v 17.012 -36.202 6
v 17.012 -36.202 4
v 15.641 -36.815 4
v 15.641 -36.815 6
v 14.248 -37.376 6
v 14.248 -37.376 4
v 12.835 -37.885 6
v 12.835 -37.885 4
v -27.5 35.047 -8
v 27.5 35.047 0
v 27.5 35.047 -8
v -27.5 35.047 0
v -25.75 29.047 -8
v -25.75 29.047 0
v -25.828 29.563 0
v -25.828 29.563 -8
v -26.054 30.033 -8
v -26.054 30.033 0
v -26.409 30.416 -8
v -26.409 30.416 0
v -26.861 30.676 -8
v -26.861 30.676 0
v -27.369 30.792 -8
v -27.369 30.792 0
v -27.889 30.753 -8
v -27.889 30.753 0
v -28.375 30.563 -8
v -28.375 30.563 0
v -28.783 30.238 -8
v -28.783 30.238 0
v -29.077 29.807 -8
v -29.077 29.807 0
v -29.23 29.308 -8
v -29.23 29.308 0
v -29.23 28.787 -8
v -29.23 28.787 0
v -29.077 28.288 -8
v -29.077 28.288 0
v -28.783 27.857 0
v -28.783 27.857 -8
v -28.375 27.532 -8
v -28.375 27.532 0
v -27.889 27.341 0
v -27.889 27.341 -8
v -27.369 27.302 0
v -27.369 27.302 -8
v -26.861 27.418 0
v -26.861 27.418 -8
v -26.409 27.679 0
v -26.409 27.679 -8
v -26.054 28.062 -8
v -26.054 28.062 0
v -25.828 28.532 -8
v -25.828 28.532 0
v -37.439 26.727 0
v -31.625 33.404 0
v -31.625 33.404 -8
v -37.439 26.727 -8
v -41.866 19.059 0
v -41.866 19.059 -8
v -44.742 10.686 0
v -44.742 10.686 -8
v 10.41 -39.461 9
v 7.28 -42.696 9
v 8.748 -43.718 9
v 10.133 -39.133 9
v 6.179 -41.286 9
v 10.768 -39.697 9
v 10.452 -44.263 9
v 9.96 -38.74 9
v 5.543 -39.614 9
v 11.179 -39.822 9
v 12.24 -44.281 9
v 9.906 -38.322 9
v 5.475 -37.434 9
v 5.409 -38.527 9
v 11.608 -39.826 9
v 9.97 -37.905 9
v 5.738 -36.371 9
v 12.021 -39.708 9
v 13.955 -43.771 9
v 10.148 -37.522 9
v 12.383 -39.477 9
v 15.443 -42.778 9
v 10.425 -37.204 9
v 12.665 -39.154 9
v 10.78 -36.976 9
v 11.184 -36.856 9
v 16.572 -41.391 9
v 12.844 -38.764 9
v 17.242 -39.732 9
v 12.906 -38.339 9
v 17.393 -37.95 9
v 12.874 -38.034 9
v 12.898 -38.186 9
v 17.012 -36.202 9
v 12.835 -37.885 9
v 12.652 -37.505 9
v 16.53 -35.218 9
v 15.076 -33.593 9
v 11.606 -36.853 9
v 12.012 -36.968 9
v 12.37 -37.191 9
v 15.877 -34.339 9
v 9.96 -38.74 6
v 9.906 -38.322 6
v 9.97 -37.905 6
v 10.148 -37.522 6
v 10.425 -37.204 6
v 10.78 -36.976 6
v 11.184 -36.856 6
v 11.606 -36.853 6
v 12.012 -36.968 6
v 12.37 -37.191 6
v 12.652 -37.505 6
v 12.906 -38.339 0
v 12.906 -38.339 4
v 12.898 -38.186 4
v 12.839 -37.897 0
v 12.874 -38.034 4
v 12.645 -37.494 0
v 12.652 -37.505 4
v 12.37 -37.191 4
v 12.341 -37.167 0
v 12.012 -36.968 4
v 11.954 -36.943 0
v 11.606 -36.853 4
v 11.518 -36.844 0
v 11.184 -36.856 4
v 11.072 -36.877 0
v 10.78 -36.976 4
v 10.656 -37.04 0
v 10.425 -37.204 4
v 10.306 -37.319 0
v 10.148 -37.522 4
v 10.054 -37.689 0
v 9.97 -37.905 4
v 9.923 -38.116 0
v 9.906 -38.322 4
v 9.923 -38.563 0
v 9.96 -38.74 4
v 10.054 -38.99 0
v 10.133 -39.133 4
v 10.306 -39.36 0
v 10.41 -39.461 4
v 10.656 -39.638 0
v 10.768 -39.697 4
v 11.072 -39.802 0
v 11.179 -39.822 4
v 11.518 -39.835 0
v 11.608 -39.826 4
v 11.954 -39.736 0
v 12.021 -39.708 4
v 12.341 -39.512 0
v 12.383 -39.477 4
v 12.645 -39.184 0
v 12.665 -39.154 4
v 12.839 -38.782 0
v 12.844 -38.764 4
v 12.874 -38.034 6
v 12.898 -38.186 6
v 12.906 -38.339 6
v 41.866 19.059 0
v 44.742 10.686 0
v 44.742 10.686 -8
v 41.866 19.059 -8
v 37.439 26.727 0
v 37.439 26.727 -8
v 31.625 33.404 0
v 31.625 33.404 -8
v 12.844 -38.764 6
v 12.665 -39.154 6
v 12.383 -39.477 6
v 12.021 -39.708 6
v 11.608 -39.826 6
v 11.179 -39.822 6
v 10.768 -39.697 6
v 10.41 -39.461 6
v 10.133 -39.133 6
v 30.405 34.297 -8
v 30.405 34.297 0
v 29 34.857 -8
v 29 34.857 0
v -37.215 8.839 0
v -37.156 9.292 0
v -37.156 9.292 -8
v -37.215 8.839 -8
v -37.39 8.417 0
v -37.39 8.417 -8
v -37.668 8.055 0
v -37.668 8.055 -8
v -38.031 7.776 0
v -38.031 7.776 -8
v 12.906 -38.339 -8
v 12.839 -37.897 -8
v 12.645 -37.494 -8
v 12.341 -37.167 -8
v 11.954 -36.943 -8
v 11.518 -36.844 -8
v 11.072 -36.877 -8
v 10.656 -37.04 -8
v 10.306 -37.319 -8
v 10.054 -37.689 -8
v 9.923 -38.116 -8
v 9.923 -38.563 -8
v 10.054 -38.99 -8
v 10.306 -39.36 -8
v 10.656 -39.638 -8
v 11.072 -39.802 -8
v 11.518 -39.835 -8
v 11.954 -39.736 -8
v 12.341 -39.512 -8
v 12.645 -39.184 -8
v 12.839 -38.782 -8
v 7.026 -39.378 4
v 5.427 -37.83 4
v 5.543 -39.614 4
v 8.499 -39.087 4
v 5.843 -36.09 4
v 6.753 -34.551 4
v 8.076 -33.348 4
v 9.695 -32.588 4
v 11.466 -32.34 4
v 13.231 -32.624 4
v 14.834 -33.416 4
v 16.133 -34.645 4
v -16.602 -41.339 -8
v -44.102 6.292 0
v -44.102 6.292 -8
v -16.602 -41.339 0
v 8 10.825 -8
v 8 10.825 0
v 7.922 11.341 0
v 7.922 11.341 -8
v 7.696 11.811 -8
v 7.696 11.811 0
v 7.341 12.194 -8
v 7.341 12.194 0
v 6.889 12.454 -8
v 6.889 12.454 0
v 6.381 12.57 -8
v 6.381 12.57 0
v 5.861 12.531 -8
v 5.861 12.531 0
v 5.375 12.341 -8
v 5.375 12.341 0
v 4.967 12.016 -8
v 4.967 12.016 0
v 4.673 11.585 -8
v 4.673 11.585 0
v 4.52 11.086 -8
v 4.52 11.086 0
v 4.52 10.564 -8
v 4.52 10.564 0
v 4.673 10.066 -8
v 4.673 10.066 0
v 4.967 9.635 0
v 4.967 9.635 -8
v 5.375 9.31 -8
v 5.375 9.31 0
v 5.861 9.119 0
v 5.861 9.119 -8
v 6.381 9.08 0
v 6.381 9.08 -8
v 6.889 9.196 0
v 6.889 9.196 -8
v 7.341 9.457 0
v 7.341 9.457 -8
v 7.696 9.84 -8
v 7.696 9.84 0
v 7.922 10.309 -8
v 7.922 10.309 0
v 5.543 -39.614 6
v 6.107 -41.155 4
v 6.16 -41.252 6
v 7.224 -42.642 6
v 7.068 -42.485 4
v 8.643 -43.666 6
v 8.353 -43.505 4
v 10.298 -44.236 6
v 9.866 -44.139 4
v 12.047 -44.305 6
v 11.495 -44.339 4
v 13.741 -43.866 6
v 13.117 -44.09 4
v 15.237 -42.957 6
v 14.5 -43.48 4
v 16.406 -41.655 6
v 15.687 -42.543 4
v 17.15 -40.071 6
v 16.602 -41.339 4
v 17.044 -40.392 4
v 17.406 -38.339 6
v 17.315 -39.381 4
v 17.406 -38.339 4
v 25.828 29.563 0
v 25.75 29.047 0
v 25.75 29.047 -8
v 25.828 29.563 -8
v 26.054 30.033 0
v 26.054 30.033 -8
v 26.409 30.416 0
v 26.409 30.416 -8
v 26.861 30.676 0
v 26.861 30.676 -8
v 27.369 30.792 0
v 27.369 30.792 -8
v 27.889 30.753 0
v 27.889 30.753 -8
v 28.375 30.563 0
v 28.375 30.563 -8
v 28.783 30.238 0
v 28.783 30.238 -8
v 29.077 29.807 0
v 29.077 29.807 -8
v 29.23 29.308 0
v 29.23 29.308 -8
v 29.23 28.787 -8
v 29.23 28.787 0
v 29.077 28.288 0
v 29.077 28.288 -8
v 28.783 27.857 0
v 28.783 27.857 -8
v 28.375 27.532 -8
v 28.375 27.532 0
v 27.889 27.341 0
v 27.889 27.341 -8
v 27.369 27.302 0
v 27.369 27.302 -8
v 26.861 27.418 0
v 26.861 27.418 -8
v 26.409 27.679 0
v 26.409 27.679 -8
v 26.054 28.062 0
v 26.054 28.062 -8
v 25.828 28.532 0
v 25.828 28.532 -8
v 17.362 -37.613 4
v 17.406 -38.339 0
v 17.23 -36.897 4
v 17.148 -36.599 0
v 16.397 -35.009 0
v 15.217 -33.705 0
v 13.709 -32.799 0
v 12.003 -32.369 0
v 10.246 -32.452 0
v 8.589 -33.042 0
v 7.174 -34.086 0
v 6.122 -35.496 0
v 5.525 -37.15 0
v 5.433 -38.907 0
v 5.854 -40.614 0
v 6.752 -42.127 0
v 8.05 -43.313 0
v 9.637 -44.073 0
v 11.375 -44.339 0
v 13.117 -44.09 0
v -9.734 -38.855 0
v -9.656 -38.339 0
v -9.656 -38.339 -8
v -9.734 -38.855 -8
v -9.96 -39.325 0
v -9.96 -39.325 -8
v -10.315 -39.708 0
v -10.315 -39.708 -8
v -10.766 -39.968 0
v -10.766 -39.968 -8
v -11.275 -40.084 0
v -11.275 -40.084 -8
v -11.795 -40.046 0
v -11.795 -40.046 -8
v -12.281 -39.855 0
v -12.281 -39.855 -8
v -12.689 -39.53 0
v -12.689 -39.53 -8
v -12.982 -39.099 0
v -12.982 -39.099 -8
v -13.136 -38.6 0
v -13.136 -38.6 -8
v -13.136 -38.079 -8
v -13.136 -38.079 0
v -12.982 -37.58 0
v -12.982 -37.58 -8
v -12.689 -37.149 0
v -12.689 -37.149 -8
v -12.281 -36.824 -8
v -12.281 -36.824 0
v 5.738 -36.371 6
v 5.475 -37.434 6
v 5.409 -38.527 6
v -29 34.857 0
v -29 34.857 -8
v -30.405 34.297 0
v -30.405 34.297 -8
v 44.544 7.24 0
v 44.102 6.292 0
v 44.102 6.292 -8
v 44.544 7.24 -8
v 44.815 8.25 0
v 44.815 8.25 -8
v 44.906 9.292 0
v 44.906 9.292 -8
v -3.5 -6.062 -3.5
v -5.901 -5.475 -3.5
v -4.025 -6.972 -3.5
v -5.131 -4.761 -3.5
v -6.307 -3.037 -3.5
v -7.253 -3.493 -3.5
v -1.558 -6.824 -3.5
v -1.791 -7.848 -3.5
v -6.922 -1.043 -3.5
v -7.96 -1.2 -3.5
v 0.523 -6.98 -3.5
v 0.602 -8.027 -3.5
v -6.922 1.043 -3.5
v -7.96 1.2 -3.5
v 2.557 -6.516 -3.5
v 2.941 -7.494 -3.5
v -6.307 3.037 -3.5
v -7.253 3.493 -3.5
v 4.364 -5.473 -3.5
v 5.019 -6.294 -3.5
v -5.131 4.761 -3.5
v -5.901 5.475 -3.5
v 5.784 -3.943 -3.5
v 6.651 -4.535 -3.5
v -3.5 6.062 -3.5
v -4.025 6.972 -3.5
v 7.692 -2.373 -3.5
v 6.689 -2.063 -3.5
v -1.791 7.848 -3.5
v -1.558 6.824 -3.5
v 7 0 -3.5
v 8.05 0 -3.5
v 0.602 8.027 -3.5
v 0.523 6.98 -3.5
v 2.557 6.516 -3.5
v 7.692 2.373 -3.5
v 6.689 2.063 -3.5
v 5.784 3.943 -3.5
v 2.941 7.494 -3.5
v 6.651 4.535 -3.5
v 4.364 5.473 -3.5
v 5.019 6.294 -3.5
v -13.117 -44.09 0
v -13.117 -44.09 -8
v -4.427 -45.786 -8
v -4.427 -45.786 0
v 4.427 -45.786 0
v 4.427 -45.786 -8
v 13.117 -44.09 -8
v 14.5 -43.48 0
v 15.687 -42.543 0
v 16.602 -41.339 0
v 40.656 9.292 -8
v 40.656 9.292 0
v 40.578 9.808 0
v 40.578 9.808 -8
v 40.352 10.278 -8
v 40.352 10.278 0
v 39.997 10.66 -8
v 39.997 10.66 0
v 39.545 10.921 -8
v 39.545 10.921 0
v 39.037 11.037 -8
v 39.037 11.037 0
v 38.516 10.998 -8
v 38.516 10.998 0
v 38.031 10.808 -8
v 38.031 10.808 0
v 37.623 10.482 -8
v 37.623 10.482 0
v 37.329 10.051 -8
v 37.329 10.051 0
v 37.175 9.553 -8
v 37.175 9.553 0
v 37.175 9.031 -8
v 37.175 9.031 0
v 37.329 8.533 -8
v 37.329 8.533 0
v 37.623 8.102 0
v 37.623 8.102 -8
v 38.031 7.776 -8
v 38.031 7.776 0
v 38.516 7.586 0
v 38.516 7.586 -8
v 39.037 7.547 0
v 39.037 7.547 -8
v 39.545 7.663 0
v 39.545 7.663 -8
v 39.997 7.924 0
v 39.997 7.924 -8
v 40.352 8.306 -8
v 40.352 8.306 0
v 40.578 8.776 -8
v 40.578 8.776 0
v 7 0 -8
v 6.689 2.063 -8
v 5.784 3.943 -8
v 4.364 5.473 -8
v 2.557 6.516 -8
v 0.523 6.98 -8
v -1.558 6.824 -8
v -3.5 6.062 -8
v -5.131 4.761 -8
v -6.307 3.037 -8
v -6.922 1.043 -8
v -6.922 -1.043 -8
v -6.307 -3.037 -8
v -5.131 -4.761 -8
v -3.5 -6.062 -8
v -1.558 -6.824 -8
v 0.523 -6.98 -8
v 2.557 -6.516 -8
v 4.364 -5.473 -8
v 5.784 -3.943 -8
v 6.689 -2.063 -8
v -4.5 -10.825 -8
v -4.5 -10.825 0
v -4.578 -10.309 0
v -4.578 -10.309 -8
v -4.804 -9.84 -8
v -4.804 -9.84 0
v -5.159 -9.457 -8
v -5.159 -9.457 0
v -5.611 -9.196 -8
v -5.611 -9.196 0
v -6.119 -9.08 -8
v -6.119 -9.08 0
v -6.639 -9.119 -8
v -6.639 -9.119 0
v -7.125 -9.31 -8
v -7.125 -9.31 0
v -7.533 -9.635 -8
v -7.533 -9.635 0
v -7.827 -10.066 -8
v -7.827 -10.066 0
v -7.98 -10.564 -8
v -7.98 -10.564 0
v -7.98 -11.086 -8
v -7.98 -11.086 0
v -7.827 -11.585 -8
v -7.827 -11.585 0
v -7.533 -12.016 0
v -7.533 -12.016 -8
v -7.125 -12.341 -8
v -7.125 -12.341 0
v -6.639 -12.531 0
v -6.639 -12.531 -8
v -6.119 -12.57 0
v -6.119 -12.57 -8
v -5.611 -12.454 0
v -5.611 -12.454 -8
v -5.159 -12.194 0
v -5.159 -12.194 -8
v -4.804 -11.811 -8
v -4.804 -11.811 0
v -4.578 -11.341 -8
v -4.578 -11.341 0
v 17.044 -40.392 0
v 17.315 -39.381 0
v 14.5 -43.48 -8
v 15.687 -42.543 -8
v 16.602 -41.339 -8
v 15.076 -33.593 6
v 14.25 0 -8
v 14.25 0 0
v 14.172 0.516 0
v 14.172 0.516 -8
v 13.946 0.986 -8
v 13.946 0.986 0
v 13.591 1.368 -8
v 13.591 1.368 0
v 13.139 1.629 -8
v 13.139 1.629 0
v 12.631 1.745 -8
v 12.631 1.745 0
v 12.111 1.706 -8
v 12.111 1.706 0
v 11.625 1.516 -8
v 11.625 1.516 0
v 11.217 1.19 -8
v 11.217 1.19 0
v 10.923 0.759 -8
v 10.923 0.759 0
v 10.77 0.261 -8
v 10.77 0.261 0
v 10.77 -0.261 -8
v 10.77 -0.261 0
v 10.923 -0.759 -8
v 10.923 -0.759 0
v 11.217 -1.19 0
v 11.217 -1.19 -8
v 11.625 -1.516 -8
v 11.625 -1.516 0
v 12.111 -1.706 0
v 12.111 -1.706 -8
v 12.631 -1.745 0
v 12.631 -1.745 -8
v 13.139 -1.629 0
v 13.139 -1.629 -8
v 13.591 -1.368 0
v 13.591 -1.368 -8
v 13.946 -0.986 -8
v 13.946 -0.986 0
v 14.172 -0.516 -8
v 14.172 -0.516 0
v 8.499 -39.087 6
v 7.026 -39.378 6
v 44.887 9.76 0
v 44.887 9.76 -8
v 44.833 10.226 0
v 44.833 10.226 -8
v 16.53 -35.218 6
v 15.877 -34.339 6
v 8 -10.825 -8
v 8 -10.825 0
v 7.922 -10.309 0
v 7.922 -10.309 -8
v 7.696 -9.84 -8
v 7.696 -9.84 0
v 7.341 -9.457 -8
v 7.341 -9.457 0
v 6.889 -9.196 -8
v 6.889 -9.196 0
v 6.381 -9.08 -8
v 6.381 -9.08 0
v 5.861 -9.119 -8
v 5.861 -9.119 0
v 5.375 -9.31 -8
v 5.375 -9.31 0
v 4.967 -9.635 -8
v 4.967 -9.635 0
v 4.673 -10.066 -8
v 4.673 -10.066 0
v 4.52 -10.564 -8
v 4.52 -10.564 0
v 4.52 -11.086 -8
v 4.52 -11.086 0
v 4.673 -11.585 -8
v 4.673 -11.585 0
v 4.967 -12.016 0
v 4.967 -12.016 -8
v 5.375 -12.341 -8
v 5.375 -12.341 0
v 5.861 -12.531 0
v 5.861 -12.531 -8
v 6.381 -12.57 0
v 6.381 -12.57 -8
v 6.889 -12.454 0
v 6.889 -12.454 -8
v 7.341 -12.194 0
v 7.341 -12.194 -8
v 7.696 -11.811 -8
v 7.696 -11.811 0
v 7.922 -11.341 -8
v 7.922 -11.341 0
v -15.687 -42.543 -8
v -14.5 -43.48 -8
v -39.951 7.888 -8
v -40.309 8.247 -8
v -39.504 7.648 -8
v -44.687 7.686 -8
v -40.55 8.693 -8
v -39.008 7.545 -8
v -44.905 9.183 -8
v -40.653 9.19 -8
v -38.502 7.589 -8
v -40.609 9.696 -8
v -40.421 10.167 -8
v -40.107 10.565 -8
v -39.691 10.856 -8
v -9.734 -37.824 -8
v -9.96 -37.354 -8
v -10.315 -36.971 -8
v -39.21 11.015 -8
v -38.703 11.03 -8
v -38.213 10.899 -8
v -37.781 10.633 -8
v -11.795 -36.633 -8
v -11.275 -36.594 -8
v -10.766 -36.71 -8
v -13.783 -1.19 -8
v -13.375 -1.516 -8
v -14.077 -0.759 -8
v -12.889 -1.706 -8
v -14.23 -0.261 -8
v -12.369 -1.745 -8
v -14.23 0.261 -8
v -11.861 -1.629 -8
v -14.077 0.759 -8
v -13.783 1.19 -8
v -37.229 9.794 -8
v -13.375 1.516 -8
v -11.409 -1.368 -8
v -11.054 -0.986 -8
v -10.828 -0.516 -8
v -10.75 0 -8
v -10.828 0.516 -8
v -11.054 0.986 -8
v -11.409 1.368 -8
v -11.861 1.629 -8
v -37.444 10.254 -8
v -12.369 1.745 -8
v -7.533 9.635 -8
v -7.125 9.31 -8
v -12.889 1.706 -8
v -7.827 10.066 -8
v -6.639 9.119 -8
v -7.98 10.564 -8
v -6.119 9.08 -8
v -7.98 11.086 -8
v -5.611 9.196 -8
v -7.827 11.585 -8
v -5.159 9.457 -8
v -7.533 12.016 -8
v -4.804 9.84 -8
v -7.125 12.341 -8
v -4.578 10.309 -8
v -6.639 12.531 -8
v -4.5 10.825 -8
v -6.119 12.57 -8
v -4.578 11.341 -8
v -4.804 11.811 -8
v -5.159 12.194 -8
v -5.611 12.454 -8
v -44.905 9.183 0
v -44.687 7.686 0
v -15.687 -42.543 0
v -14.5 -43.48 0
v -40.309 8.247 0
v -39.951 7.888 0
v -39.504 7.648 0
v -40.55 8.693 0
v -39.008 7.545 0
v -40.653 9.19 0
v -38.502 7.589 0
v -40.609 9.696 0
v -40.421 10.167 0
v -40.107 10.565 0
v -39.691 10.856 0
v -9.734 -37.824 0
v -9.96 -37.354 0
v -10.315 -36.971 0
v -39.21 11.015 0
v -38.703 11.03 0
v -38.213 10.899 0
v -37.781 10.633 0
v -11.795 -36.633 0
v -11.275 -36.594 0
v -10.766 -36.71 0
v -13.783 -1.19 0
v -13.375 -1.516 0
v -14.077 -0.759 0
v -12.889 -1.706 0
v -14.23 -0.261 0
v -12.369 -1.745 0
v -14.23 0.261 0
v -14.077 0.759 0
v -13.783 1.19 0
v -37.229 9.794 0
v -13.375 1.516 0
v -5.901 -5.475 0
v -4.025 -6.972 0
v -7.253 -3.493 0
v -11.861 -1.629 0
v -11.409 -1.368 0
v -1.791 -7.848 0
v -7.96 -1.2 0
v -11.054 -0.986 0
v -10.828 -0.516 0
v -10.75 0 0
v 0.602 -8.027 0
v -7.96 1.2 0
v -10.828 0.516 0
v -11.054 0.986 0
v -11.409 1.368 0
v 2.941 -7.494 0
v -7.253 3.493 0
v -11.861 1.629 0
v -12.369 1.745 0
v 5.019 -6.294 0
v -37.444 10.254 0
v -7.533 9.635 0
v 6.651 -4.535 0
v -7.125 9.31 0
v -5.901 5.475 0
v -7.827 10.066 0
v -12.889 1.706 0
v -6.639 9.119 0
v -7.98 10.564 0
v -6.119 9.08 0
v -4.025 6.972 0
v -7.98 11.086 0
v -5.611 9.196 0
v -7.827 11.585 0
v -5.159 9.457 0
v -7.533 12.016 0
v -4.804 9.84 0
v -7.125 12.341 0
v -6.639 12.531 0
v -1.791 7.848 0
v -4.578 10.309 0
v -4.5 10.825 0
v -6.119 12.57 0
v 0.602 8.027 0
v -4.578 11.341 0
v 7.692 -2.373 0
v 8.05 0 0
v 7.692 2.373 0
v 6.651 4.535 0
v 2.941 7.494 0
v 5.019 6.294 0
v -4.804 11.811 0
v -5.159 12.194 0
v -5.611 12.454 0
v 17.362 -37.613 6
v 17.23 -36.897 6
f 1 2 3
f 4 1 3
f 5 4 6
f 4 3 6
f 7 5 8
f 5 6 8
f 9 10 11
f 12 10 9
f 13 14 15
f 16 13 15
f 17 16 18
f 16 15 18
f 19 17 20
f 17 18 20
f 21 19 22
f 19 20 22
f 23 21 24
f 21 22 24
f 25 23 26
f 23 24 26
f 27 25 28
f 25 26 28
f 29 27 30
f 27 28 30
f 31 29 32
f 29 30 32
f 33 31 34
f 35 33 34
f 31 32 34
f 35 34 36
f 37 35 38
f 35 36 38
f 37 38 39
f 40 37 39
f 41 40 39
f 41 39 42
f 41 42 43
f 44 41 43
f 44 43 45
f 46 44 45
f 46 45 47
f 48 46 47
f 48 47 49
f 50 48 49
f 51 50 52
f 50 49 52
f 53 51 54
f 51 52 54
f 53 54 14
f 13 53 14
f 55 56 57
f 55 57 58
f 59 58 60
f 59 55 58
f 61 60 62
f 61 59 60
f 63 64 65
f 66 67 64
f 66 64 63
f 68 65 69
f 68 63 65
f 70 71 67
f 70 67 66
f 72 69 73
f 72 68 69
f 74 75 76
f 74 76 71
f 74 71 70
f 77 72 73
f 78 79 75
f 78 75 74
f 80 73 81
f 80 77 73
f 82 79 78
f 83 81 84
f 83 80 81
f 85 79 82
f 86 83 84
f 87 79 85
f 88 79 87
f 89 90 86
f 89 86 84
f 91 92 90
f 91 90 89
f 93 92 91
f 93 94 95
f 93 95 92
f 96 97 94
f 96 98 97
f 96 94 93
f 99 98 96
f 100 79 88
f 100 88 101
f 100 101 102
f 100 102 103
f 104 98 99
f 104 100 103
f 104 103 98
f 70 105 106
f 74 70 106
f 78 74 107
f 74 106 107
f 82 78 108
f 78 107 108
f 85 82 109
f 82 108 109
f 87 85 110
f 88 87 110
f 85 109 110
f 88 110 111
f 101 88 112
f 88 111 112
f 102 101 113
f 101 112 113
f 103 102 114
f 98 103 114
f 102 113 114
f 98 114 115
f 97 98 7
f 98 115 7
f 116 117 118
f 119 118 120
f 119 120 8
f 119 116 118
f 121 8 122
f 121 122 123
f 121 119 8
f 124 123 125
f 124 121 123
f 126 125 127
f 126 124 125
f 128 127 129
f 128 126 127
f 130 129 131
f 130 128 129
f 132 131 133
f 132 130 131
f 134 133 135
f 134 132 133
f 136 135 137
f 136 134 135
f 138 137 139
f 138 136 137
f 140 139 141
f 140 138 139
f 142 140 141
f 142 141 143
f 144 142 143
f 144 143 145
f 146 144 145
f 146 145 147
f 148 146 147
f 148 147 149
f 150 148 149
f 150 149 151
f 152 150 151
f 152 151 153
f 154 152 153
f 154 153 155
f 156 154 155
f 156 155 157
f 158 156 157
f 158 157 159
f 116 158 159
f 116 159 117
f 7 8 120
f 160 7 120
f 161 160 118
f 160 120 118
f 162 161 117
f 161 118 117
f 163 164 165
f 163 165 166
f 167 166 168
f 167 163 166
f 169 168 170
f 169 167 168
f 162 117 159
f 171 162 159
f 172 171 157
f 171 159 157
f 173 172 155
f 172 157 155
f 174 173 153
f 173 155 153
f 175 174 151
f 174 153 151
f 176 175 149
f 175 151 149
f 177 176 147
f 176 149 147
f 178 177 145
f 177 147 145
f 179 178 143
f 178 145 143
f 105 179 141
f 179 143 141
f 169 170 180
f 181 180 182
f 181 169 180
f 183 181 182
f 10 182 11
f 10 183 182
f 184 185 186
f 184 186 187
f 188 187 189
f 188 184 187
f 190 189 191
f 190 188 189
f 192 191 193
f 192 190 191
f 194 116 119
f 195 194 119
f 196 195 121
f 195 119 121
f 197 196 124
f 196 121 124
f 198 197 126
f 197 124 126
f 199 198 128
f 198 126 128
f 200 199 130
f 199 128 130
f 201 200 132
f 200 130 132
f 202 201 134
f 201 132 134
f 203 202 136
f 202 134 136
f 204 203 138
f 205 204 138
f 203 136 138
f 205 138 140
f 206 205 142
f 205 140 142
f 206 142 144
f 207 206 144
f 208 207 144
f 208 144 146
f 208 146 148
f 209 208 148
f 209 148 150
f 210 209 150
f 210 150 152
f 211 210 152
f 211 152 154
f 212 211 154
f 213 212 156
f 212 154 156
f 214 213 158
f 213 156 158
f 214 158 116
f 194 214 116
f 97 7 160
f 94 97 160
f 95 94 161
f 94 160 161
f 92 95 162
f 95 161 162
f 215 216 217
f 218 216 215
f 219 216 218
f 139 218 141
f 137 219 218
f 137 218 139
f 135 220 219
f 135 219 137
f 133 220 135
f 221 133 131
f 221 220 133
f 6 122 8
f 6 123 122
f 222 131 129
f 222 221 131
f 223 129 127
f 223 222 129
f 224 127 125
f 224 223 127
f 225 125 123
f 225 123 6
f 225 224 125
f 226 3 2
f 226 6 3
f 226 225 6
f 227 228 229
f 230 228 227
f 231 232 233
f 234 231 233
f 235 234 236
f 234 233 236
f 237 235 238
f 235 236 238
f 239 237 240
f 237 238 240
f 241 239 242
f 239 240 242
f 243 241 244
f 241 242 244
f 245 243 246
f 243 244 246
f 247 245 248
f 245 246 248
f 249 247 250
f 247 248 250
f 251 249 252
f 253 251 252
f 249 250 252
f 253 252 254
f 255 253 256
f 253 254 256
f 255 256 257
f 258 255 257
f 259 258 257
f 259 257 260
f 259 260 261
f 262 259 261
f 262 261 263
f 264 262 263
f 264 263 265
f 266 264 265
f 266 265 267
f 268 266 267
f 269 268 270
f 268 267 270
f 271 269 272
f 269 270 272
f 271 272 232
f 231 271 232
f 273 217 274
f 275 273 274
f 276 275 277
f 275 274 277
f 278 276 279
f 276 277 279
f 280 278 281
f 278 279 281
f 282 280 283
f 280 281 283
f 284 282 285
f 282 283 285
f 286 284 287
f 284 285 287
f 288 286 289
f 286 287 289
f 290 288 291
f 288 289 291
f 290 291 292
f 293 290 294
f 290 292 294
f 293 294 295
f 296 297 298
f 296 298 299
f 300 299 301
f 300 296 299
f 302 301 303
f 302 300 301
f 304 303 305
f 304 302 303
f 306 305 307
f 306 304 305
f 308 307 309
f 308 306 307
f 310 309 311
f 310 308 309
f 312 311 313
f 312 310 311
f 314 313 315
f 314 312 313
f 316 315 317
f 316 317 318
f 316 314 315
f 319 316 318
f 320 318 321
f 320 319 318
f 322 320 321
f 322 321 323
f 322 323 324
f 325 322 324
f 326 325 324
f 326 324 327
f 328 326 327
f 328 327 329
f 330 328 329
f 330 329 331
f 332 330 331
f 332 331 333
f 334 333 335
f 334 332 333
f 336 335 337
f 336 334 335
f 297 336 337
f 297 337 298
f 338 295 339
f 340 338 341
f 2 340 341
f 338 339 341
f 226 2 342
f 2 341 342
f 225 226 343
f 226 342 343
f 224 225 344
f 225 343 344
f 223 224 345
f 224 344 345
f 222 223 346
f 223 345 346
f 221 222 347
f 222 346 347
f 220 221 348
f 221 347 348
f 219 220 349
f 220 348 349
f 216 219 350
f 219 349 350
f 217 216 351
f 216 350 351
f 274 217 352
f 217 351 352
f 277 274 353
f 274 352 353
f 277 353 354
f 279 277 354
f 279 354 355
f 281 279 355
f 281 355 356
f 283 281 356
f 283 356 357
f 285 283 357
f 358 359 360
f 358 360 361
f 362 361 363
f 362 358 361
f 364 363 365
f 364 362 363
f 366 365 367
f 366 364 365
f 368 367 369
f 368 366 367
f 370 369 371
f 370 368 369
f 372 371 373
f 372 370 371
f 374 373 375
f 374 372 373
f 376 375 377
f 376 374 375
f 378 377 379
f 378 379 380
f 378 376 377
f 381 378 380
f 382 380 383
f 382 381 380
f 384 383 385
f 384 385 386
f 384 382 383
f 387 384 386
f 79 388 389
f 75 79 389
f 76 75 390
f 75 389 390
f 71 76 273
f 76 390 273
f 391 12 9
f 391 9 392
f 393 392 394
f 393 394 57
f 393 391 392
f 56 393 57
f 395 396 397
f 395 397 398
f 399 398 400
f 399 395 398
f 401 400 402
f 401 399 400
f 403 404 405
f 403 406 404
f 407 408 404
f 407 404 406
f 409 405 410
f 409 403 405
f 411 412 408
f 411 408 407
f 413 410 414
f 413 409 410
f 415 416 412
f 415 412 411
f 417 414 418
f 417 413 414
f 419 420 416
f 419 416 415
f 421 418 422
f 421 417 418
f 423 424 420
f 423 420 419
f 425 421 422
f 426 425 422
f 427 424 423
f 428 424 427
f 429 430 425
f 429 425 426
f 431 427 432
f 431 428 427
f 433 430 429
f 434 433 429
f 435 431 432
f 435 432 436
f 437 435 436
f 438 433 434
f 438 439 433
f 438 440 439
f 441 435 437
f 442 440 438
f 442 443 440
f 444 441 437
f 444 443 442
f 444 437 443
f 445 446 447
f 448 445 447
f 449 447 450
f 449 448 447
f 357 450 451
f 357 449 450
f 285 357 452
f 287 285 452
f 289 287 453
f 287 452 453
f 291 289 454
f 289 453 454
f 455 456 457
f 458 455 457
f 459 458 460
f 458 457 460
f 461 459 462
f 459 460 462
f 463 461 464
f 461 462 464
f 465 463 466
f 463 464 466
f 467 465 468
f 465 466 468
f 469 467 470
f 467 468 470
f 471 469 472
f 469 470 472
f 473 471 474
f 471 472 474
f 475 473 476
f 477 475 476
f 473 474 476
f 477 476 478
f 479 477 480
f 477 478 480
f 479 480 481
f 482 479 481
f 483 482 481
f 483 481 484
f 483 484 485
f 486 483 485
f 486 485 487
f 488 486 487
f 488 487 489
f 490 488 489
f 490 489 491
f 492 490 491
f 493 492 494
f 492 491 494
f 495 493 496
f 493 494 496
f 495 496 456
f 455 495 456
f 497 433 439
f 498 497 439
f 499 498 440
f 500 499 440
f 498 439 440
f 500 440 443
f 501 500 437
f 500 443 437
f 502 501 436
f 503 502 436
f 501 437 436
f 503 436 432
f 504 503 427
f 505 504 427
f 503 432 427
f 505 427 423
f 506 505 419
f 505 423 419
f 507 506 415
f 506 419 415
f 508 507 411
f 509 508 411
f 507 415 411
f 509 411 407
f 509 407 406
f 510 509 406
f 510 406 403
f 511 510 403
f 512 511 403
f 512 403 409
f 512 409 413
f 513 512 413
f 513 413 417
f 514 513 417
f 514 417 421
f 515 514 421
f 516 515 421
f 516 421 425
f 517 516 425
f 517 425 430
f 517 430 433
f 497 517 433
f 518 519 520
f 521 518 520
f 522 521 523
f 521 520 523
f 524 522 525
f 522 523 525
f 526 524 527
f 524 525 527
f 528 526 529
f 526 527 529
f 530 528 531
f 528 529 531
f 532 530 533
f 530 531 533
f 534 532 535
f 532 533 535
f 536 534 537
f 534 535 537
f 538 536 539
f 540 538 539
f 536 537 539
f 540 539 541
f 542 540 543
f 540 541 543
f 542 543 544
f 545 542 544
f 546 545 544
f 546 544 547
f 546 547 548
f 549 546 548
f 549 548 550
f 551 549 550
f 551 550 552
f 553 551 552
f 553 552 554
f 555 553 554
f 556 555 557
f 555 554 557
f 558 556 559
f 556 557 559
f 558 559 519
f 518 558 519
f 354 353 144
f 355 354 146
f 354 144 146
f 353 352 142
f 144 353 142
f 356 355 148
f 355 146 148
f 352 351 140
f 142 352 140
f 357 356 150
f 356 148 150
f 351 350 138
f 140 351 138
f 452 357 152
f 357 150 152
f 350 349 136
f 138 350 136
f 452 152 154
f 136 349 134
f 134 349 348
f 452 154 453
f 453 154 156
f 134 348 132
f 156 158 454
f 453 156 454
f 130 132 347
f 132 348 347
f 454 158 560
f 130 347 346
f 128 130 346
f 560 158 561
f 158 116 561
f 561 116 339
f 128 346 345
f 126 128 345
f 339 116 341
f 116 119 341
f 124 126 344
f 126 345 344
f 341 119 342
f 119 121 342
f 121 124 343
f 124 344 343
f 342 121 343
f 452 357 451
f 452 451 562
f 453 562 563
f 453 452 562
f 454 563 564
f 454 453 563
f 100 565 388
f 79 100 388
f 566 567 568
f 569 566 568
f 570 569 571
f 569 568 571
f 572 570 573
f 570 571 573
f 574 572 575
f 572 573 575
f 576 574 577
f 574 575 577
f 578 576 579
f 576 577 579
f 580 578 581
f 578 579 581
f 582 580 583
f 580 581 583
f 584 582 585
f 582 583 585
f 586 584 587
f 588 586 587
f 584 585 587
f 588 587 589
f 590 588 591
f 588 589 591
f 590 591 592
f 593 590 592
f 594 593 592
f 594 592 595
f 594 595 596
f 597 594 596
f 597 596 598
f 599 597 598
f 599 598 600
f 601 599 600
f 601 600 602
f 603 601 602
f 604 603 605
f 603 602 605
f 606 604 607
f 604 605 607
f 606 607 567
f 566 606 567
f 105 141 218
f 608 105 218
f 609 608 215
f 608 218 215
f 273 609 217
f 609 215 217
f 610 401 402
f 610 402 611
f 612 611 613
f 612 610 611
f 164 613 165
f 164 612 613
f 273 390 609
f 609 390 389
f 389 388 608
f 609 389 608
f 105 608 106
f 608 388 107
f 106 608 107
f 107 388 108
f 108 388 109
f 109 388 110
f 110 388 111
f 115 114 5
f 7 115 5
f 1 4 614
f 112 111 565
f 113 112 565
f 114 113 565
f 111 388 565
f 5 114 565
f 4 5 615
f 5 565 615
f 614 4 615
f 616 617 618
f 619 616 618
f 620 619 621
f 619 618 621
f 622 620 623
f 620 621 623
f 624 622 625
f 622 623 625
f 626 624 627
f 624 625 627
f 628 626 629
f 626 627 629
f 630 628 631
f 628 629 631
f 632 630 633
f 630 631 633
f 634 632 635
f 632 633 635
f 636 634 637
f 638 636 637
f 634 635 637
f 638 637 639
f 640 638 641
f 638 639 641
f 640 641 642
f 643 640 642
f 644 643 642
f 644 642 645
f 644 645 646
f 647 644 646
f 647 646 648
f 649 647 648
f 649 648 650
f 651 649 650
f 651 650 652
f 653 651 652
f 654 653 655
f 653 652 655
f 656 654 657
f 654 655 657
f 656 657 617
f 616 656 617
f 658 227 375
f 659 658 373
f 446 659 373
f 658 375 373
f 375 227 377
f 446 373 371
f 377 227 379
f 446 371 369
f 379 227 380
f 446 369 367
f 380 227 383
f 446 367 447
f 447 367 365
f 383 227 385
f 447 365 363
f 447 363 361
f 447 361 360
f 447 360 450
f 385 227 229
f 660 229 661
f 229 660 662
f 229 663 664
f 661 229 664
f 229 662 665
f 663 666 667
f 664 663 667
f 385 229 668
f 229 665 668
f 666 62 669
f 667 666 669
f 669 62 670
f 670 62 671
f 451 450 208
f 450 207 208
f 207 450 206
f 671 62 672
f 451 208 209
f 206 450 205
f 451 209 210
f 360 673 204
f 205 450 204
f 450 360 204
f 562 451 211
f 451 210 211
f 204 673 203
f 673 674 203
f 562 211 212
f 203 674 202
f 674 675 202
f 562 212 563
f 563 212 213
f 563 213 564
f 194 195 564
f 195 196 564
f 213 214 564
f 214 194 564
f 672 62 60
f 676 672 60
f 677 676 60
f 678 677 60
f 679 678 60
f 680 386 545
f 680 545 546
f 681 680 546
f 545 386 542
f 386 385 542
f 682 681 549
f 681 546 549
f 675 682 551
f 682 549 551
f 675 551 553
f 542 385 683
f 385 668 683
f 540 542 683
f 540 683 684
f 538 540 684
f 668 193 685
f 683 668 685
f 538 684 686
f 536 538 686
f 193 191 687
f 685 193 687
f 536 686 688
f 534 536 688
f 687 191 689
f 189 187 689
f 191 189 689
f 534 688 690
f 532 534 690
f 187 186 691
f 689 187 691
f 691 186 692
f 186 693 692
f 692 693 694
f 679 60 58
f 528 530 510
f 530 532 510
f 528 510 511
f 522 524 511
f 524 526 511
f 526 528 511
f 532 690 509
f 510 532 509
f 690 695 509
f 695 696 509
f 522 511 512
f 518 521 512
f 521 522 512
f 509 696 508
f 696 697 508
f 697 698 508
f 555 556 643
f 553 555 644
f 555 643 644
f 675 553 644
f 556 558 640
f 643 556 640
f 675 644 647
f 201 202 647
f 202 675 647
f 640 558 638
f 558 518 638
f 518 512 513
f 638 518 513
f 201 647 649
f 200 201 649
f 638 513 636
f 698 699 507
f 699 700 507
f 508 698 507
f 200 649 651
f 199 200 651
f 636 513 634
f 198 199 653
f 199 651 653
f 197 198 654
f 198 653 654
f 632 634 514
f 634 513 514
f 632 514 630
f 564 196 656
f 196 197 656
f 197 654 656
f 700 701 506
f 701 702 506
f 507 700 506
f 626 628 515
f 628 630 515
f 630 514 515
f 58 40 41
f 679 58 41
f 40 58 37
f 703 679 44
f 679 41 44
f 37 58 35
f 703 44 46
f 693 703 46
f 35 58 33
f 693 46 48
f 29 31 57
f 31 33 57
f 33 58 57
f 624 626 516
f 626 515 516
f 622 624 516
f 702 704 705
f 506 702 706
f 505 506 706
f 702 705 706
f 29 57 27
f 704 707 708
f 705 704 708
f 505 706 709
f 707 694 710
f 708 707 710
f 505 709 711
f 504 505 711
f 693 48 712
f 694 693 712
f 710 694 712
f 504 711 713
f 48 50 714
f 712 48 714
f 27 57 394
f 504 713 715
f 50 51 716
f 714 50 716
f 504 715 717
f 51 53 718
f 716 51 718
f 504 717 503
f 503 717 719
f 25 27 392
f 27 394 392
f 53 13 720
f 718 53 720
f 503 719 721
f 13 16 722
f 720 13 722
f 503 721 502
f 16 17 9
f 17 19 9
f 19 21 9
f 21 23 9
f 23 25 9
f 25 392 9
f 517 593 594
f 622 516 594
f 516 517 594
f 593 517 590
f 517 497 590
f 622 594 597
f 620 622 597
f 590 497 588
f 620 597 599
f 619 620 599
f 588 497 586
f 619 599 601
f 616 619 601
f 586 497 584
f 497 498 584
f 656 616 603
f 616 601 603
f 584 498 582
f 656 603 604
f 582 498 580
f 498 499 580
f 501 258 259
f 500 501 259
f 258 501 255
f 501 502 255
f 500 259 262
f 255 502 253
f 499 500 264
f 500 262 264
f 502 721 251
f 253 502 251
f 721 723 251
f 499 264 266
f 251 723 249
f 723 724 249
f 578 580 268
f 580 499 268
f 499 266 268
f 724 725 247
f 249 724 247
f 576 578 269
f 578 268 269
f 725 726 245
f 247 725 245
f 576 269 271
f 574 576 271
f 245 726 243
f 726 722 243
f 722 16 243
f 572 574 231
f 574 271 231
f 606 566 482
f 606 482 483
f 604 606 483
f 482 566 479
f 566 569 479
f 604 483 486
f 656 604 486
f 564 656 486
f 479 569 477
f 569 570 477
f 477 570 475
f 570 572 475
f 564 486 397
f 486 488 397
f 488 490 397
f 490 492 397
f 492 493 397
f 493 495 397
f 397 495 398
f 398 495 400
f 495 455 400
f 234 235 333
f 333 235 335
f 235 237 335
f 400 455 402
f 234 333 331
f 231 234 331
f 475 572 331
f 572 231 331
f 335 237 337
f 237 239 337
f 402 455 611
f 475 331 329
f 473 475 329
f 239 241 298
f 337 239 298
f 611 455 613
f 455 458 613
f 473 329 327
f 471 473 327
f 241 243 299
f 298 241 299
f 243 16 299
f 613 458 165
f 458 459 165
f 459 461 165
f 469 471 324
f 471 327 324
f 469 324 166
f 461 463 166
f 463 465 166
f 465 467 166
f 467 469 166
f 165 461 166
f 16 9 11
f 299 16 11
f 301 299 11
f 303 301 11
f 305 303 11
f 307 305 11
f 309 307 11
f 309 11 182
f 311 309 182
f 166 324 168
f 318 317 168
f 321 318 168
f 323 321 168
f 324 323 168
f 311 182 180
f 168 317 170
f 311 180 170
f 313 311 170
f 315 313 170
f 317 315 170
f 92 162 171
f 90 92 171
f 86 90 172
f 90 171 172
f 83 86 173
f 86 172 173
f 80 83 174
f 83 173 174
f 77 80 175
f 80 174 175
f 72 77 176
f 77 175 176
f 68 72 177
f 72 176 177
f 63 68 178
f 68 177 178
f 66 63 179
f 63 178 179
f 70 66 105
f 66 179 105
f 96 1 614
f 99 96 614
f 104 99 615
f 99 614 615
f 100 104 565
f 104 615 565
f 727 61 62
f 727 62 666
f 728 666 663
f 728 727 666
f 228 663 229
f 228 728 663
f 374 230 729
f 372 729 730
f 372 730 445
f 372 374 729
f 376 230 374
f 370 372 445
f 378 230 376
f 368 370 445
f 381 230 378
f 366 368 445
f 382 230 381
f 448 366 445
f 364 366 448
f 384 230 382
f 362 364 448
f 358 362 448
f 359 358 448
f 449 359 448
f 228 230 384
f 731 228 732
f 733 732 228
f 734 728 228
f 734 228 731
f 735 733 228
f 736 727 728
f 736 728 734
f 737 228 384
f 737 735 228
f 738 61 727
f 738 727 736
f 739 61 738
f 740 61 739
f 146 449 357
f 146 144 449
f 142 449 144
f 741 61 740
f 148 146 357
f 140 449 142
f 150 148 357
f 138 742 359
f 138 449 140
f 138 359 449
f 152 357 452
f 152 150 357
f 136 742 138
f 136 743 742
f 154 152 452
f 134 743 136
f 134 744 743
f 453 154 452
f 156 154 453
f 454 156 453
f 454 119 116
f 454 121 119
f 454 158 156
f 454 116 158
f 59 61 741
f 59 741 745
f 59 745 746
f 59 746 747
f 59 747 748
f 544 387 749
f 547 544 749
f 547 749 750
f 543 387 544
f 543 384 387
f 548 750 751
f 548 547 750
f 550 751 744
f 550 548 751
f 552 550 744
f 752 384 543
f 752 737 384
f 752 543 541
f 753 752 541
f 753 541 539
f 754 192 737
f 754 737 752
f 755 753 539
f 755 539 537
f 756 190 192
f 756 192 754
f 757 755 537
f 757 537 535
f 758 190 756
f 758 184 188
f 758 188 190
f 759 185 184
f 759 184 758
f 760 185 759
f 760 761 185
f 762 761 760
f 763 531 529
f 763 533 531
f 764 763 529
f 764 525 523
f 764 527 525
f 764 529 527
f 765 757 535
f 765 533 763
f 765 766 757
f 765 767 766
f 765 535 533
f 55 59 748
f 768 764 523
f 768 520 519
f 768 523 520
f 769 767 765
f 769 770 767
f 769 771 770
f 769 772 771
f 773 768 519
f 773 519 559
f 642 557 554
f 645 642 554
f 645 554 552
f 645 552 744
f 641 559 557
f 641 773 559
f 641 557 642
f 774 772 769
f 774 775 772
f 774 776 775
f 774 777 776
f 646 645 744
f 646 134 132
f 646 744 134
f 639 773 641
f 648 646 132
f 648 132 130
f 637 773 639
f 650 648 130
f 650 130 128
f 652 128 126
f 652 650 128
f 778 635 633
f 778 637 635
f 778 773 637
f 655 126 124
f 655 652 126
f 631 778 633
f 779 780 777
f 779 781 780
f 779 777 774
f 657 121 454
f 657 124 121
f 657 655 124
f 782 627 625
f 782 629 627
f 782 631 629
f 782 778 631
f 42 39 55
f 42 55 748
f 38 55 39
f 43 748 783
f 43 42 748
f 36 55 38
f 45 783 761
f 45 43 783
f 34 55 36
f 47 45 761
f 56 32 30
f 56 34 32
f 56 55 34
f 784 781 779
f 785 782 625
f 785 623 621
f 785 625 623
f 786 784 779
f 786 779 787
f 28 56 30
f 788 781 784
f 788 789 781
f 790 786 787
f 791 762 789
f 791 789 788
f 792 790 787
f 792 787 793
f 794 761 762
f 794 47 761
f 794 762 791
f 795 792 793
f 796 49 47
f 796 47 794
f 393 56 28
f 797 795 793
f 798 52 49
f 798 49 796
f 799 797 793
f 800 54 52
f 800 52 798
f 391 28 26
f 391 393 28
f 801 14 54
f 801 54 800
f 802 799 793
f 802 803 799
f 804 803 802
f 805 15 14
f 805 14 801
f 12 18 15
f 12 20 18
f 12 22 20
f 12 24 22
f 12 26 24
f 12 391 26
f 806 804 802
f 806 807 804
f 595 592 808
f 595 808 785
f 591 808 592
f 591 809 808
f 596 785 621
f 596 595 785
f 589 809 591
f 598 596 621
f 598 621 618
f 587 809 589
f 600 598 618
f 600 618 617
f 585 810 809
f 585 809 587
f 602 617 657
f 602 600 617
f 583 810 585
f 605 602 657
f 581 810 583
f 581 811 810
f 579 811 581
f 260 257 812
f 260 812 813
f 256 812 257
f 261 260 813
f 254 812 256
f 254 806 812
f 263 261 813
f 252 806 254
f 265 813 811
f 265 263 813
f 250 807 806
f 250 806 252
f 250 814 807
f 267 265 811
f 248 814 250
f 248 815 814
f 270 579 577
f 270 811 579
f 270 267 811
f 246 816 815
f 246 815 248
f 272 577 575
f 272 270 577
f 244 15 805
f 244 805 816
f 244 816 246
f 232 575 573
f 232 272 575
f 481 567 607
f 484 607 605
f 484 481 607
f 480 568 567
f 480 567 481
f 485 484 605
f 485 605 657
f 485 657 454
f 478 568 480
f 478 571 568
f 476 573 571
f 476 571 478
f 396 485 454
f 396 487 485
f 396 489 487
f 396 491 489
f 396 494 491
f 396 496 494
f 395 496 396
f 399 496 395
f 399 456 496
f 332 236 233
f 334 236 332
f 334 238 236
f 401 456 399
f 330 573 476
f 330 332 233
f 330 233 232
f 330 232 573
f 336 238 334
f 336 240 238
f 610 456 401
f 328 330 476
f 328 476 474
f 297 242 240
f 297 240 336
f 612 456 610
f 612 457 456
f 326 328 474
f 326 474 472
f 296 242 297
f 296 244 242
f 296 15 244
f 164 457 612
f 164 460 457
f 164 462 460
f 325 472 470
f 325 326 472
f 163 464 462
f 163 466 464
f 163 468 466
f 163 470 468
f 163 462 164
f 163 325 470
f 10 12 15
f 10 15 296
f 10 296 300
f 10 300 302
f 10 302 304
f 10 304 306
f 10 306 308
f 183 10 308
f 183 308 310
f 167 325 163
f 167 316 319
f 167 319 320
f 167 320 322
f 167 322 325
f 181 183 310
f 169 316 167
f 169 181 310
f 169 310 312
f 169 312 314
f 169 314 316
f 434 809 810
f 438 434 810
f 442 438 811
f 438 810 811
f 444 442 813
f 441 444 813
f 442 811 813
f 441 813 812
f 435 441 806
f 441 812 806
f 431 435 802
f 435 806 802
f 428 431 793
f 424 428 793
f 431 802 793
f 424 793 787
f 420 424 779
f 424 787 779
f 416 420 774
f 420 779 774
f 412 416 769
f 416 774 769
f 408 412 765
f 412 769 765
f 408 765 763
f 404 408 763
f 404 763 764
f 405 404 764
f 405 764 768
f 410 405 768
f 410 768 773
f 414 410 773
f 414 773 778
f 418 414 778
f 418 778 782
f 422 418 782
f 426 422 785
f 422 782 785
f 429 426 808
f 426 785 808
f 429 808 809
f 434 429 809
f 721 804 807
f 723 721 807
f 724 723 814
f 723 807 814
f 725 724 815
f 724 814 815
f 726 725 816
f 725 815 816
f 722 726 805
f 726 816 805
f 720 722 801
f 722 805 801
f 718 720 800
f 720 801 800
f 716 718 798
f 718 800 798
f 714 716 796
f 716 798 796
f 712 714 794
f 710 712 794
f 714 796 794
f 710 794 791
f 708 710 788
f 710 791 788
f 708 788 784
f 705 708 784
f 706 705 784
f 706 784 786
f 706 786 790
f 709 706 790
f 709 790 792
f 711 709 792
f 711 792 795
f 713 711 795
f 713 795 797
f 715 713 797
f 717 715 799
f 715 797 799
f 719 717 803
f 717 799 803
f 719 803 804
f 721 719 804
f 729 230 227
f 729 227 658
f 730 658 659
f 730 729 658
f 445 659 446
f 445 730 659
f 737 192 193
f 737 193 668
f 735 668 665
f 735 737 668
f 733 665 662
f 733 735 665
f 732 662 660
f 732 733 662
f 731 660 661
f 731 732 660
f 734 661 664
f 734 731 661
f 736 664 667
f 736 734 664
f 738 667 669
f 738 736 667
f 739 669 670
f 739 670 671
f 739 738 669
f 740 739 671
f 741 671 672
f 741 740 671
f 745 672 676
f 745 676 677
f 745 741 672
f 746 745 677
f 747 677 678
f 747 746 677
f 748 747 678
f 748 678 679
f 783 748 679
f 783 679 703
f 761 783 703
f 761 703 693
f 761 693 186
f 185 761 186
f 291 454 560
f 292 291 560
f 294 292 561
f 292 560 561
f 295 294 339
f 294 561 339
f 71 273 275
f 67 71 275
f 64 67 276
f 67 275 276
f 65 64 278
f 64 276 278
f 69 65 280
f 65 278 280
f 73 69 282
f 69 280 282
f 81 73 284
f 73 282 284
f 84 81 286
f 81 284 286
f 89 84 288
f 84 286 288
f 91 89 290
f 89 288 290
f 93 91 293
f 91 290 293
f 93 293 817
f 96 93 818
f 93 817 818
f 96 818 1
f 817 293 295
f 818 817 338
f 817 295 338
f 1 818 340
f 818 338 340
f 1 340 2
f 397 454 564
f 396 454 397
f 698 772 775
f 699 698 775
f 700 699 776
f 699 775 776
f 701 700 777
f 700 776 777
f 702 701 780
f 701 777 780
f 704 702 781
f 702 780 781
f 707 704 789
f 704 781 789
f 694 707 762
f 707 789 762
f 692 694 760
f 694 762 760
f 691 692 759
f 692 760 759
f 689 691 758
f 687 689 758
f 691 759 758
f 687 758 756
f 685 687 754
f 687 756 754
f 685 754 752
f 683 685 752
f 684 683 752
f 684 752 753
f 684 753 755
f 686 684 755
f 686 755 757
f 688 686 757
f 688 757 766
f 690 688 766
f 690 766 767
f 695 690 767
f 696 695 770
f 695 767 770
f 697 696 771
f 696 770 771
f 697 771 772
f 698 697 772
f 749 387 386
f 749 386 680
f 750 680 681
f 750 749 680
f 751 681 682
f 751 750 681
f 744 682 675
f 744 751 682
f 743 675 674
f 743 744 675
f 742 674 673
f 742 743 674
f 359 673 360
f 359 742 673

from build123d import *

# Parameters (mm, degrees)
F0_R     = 1.75
F0_R_2   = 8.05
F0_R_3   = 1.5
F0_R_4   = 7
F1_DEPTH = 8
F2_DEPTH = 3.5
F3_DEPTH = 4
F5_DEPTH = 2
F7_DEPTH = 3


# Not quite as in the source:
# - a feature names something its author has since deleted; it is built from what else it names


with BuildPart() as f1:
    # F0 (on Top) → F1 (new body)
    with BuildSketch(Plane.XY):
        with BuildLine():
            ThreePointArc((-32.9057647469, 9.2920110558), (-33.7096123242, 6.2920110558), (-35.9057647469, 4.0958586331))
            Line((-35.9057647469, 4.0958586331), (-14.4057647469, -33.1432337296))
            ThreePointArc((-14.4057647469, -33.1432337296), (-8.4057647469, -33.1432337296), (-5.4057647469, -38.3393861523))
            ThreePointArc((-5.4057647469, -38.3393861523), (-7.8186481903, -43.1490217736), (-13.1166296833, -44.0902940084))
            ThreePointArc((-13.1166296833, -44.0902940084), (-2.42e-07, -46), (13.1166292194, -44.0902941464))
            ThreePointArc((13.1166292194, -44.0902941464), (6.5961292703, -34.7522694018), (17.4057647469, -38.3393861523))
            ThreePointArc((17.4057647469, -38.3393861523), (17.2013197046, -39.892300423), (16.6019171696, -41.3393861523))
            Line((16.6019171696, -41.3393861523), (44.1019171696, 6.2920110558))
            ThreePointArc((44.1019171696, 6.2920110558), (32.9683642938, 10.1564622456), (44.7416293579, 10.685813137))
            ThreePointArc((44.7416293579, 10.685813137), (39.8371685393, 23.0000000602), (31.6250002147, 33.4044811578))
            ThreePointArc((31.6250002147, 33.4044811578), (33.0113519797, 31.4190832059), (33.5, 29.0473750966))
            ThreePointArc((33.5, 29.0473750966), (27.5, 23.0473750966), (21.5, 29.0473750966))
            Line((21.5, 29.0473750966), (-21.5, 29.0473750966))
            ThreePointArc((-21.5, 29.0473750966), (-29.8717083356, 23.5360232142), (-31.624999857, 33.4044814964))
            ThreePointArc((-31.624999857, 33.4044814964), (-39.837168539, 23.0000000607), (-44.7416294721, 10.6858126589))
            ThreePointArc((-44.7416294721, 10.6858126589), (-38.2040484051, 15.2508359547), (-32.9057647469, 9.2920110558))
        make_face()
        with Locations((-6.25, -10.8253175473)):
            Circle(F0_R, mode=Mode.SUBTRACT)
        with Locations((6.25, -10.8253175473)):
            Circle(F0_R, mode=Mode.SUBTRACT)
        with Locations((-12.5, 0)):
            Circle(F0_R, mode=Mode.SUBTRACT)
        with Locations((-6.25, 10.8253175473)):
            Circle(F0_R, mode=Mode.SUBTRACT)
        Circle(F0_R_2, mode=Mode.SUBTRACT)
        with Locations((6.25, 10.8253175473)):
            Circle(F0_R, mode=Mode.SUBTRACT)
        with Locations((12.5, 0)):
            Circle(F0_R, mode=Mode.SUBTRACT)
        with BuildLine():
            Line((27.5, 35.0473750966), (-27.5, 35.0473750966))
            ThreePointArc((-27.5, 35.0473750966), (-23.2573593129, 33.2900157837), (-21.5, 29.0473750966))
            Line((-21.5, 29.0473750966), (21.5, 29.0473750966))
            ThreePointArc((21.5, 29.0473750966), (23.2573593129, 33.2900157837), (27.5, 35.0473750966))
        make_face()
        with BuildLine():
            ThreePointArc((-27.5, 35.0473750966), (-29.7200632424, 34.6215404331), (-31.624999857, 33.4044814964))
            ThreePointArc((-31.624999857, 33.4044814964), (-29.8717083356, 23.5360232142), (-21.5, 29.0473750966))
            ThreePointArc((-21.5, 29.0473750966), (-23.2573593129, 33.2900157837), (-27.5, 35.0473750966))
        make_face()
        with Locations((-27.5, 29.0473750966)):
            Circle(F0_R, mode=Mode.SUBTRACT)
        with BuildLine():
            ThreePointArc((33.5, 29.0473750966), (33.0113519797, 31.4190832059), (31.6250002147, 33.4044811578))
            ThreePointArc((31.6250002147, 33.4044811578), (29.7200634712, 34.621540342), (27.5, 35.0473750966))
            ThreePointArc((27.5, 35.0473750966), (23.2573593129, 33.2900157837), (21.5, 29.0473750966))
            ThreePointArc((21.5, 29.0473750966), (27.5, 23.0473750966), (33.5, 29.0473750966))
        make_face()
        with BuildLine():
            ThreePointArc((29.25, 29.0473750966), (27.5, 27.2973750966), (25.75, 29.0473750966))
            ThreePointArc((25.75, 29.0473750966), (27.5, 30.7973750966), (29.25, 29.0473750966))
        make_face(mode=Mode.SUBTRACT)
        with BuildLine():
            ThreePointArc((44.9057647469, 9.2920110558), (44.864589617, 9.9937276417), (44.7416293579, 10.685813137))
            ThreePointArc((44.7416293579, 10.685813137), (32.9683642938, 10.1564622456), (44.1019171696, 6.2920110558))
            ThreePointArc((44.1019171696, 6.2920110558), (44.7013197046, 7.7390967852), (44.9057647469, 9.2920110558))
        make_face()
        with Locations((38.9057647469, 9.2920110558)):
            Circle(F0_R, mode=Mode.SUBTRACT)
        with BuildLine():
            ThreePointArc((17.4057647469, -38.3393861523), (6.5961292703, -34.7522694018), (13.1166292194, -44.0902941464))
            ThreePointArc((13.1166292194, -44.0902941464), (15.1231017367, -43.049100125), (16.6019171696, -41.3393861523))
            ThreePointArc((16.6019171696, -41.3393861523), (17.2013197046, -39.892300423), (17.4057647469, -38.3393861523))
        make_face()
        with Locations((11.4057647469, -38.3393861523)):
            Circle(F0_R_3, mode=Mode.SUBTRACT)
        with BuildLine():
            ThreePointArc((-5.4057647469, -38.3393861523), (-8.4057647469, -33.1432337296), (-14.4057647469, -33.1432337296))
            ThreePointArc((-14.4057647469, -33.1432337296), (-17.2013197046, -36.7864718817), (-16.6019171696, -41.3393861523))
            ThreePointArc((-16.6019171696, -41.3393861523), (-15.1231019266, -43.0490999751), (-13.1166296833, -44.0902940084))
            ThreePointArc((-13.1166296833, -44.0902940084), (-7.8186481903, -43.1490217736), (-5.4057647469, -38.3393861523))
        make_face()
        with BuildLine():
            ThreePointArc((-9.6557647469, -38.3393861523), (-12.2807647469, -39.854930609), (-12.2807647469, -36.8238416957))
            ThreePointArc((-12.2807647469, -36.8238416957), (-10.5307647469, -36.8238416957), (-9.6557647469, -38.3393861523))
        make_face(mode=Mode.SUBTRACT)
        with BuildLine():
            Line((-14.4057647469, -33.1432337296), (-35.9057647469, 4.0958586331))
            ThreePointArc((-35.9057647469, 4.0958586331), (-40.4586790175, 3.4964560981), (-44.1019171696, 6.2920110558))
            Line((-44.1019171696, 6.2920110558), (-16.6019171696, -41.3393861523))
            ThreePointArc((-16.6019171696, -41.3393861523), (-17.2013197046, -36.7864718817), (-14.4057647469, -33.1432337296))
        make_face()
        with BuildLine():
            ThreePointArc((-44.1019171696, 6.2920110558), (-40.4586790175, 3.4964560981), (-35.9057647469, 4.0958586331))
            ThreePointArc((-35.9057647469, 4.0958586331), (-33.7096123242, 6.2920110558), (-32.9057647469, 9.2920110558))
            ThreePointArc((-32.9057647469, 9.2920110558), (-38.2040484051, 15.2508359547), (-44.7416294721, 10.6858126589))
            ThreePointArc((-44.7416294721, 10.6858126589), (-44.8431651646, 8.4275596228), (-44.1019171696, 6.2920110558))
        make_face()
        with BuildLine():
            ThreePointArc((-38.0307647469, 7.7764665992), (-40.4213092035, 10.1670110558), (-37.1557647469, 9.2920110558))
            ThreePointArc((-37.1557647469, 9.2920110558), (-37.3902202902, 8.4170110558), (-38.0307647469, 7.7764665992))
        make_face(mode=Mode.SUBTRACT)
        Circle(F0_R_2)
        Circle(F0_R_4, mode=Mode.SUBTRACT)
    extrude(amount=-F1_DEPTH)

    # F0 (on Top) → F2 (cut)
    with BuildSketch(Plane.XY):
        Circle(F0_R_2)
        Circle(F0_R_4, mode=Mode.SUBTRACT)
    extrude(amount=-F2_DEPTH, mode=Mode.SUBTRACT)


with BuildPart() as f3:
    # F0 (on Top) → F3 (new body)
    with BuildSketch(Plane.XY):
        with BuildLine():
            ThreePointArc((17.4057647469, -38.3393861523), (6.5961292703, -34.7522694018), (13.1166292194, -44.0902941464))
            ThreePointArc((13.1166292194, -44.0902941464), (15.1231017367, -43.049100125), (16.6019171696, -41.3393861523))
            ThreePointArc((16.6019171696, -41.3393861523), (17.2013197046, -39.892300423), (17.4057647469, -38.3393861523))
        make_face()
        with Locations((11.4057647469, -38.3393861523)):
            Circle(F0_R_3, mode=Mode.SUBTRACT)
    extrude(amount=F3_DEPTH)

    # F4 (on face) → F5 (join)
    with BuildSketch(Plane.XY.offset(4)):
        with BuildLine():
            ThreePointArc((9.9602708355, -38.7400697584), (7.7638146886, -39.2393065877), (5.5427392086, -39.6141141775))
            ThreePointArc((5.5427392086, -39.6141141775), (12.0467978079, -44.3050442564), (17.4057647469, -38.3393861523))
            ThreePointArc((17.4057647469, -38.3393861523), (17.3065432967, -37.2527341815), (17.0121605783, -36.2020219388))
            ThreePointArc((17.0121605783, -36.2020219388), (14.947389292, -37.1022311102), (12.8352193016, -37.8847877845))
            ThreePointArc((12.8352193016, -37.8847877845), (12.8880234679, -38.1093664054), (12.9057647469, -38.3393861523))
            ThreePointArc((12.9057647469, -38.3393861523), (11.607951706, -39.8256971674), (9.9602708355, -38.7400697584))
        make_face()
    extrude(amount=F5_DEPTH)

    # F6 (on face) → F7 (join)
    with BuildSketch(Plane.XY.offset(6)):
        with BuildLine():
            ThreePointArc((5.5427392086, -39.6141141775), (13.1166294589, -44.0902940752), (17.0121605783, -36.2020219388))
            ThreePointArc((17.0121605783, -36.2020219388), (14.947389292, -37.1022311102), (12.8352193016, -37.8847877845))
            ThreePointArc((12.8352193016, -37.8847877845), (12.8880234679, -38.1093664054), (12.9057647469, -38.3393861523))
            ThreePointArc((12.9057647469, -38.3393861523), (11.607951706, -39.8256971674), (9.9602708355, -38.7400697584))
            ThreePointArc((9.9602708355, -38.7400697584), (7.7638146886, -39.2393065877), (5.5427392086, -39.6141141775))
        make_face()
        with BuildLine():
            ThreePointArc((12.8352193016, -37.8847877845), (14.947389292, -37.1022311102), (17.0121605783, -36.2020219388))
            ThreePointArc((17.0121605783, -36.2020219388), (16.2239290423, -34.7637333696), (15.0756758433, -33.5926238301))
            Line((15.0756758433, -33.5926238301), (5.737994077, -36.3705348035))
            ThreePointArc((5.737994077, -36.3705348035), (5.4166064515, -37.9788547209), (5.5427392086, -39.6141141775))
            ThreePointArc((5.5427392086, -39.6141141775), (7.7638146886, -39.2393065877), (9.9602708355, -38.7400697584))
            ThreePointArc((9.9602708355, -38.7400697584), (10.9780485689, -36.9016591716), (12.8352193016, -37.8847877845))
        make_face()
    extrude(amount=F7_DEPTH)


solid = Compound([f1.part, f3.part])
